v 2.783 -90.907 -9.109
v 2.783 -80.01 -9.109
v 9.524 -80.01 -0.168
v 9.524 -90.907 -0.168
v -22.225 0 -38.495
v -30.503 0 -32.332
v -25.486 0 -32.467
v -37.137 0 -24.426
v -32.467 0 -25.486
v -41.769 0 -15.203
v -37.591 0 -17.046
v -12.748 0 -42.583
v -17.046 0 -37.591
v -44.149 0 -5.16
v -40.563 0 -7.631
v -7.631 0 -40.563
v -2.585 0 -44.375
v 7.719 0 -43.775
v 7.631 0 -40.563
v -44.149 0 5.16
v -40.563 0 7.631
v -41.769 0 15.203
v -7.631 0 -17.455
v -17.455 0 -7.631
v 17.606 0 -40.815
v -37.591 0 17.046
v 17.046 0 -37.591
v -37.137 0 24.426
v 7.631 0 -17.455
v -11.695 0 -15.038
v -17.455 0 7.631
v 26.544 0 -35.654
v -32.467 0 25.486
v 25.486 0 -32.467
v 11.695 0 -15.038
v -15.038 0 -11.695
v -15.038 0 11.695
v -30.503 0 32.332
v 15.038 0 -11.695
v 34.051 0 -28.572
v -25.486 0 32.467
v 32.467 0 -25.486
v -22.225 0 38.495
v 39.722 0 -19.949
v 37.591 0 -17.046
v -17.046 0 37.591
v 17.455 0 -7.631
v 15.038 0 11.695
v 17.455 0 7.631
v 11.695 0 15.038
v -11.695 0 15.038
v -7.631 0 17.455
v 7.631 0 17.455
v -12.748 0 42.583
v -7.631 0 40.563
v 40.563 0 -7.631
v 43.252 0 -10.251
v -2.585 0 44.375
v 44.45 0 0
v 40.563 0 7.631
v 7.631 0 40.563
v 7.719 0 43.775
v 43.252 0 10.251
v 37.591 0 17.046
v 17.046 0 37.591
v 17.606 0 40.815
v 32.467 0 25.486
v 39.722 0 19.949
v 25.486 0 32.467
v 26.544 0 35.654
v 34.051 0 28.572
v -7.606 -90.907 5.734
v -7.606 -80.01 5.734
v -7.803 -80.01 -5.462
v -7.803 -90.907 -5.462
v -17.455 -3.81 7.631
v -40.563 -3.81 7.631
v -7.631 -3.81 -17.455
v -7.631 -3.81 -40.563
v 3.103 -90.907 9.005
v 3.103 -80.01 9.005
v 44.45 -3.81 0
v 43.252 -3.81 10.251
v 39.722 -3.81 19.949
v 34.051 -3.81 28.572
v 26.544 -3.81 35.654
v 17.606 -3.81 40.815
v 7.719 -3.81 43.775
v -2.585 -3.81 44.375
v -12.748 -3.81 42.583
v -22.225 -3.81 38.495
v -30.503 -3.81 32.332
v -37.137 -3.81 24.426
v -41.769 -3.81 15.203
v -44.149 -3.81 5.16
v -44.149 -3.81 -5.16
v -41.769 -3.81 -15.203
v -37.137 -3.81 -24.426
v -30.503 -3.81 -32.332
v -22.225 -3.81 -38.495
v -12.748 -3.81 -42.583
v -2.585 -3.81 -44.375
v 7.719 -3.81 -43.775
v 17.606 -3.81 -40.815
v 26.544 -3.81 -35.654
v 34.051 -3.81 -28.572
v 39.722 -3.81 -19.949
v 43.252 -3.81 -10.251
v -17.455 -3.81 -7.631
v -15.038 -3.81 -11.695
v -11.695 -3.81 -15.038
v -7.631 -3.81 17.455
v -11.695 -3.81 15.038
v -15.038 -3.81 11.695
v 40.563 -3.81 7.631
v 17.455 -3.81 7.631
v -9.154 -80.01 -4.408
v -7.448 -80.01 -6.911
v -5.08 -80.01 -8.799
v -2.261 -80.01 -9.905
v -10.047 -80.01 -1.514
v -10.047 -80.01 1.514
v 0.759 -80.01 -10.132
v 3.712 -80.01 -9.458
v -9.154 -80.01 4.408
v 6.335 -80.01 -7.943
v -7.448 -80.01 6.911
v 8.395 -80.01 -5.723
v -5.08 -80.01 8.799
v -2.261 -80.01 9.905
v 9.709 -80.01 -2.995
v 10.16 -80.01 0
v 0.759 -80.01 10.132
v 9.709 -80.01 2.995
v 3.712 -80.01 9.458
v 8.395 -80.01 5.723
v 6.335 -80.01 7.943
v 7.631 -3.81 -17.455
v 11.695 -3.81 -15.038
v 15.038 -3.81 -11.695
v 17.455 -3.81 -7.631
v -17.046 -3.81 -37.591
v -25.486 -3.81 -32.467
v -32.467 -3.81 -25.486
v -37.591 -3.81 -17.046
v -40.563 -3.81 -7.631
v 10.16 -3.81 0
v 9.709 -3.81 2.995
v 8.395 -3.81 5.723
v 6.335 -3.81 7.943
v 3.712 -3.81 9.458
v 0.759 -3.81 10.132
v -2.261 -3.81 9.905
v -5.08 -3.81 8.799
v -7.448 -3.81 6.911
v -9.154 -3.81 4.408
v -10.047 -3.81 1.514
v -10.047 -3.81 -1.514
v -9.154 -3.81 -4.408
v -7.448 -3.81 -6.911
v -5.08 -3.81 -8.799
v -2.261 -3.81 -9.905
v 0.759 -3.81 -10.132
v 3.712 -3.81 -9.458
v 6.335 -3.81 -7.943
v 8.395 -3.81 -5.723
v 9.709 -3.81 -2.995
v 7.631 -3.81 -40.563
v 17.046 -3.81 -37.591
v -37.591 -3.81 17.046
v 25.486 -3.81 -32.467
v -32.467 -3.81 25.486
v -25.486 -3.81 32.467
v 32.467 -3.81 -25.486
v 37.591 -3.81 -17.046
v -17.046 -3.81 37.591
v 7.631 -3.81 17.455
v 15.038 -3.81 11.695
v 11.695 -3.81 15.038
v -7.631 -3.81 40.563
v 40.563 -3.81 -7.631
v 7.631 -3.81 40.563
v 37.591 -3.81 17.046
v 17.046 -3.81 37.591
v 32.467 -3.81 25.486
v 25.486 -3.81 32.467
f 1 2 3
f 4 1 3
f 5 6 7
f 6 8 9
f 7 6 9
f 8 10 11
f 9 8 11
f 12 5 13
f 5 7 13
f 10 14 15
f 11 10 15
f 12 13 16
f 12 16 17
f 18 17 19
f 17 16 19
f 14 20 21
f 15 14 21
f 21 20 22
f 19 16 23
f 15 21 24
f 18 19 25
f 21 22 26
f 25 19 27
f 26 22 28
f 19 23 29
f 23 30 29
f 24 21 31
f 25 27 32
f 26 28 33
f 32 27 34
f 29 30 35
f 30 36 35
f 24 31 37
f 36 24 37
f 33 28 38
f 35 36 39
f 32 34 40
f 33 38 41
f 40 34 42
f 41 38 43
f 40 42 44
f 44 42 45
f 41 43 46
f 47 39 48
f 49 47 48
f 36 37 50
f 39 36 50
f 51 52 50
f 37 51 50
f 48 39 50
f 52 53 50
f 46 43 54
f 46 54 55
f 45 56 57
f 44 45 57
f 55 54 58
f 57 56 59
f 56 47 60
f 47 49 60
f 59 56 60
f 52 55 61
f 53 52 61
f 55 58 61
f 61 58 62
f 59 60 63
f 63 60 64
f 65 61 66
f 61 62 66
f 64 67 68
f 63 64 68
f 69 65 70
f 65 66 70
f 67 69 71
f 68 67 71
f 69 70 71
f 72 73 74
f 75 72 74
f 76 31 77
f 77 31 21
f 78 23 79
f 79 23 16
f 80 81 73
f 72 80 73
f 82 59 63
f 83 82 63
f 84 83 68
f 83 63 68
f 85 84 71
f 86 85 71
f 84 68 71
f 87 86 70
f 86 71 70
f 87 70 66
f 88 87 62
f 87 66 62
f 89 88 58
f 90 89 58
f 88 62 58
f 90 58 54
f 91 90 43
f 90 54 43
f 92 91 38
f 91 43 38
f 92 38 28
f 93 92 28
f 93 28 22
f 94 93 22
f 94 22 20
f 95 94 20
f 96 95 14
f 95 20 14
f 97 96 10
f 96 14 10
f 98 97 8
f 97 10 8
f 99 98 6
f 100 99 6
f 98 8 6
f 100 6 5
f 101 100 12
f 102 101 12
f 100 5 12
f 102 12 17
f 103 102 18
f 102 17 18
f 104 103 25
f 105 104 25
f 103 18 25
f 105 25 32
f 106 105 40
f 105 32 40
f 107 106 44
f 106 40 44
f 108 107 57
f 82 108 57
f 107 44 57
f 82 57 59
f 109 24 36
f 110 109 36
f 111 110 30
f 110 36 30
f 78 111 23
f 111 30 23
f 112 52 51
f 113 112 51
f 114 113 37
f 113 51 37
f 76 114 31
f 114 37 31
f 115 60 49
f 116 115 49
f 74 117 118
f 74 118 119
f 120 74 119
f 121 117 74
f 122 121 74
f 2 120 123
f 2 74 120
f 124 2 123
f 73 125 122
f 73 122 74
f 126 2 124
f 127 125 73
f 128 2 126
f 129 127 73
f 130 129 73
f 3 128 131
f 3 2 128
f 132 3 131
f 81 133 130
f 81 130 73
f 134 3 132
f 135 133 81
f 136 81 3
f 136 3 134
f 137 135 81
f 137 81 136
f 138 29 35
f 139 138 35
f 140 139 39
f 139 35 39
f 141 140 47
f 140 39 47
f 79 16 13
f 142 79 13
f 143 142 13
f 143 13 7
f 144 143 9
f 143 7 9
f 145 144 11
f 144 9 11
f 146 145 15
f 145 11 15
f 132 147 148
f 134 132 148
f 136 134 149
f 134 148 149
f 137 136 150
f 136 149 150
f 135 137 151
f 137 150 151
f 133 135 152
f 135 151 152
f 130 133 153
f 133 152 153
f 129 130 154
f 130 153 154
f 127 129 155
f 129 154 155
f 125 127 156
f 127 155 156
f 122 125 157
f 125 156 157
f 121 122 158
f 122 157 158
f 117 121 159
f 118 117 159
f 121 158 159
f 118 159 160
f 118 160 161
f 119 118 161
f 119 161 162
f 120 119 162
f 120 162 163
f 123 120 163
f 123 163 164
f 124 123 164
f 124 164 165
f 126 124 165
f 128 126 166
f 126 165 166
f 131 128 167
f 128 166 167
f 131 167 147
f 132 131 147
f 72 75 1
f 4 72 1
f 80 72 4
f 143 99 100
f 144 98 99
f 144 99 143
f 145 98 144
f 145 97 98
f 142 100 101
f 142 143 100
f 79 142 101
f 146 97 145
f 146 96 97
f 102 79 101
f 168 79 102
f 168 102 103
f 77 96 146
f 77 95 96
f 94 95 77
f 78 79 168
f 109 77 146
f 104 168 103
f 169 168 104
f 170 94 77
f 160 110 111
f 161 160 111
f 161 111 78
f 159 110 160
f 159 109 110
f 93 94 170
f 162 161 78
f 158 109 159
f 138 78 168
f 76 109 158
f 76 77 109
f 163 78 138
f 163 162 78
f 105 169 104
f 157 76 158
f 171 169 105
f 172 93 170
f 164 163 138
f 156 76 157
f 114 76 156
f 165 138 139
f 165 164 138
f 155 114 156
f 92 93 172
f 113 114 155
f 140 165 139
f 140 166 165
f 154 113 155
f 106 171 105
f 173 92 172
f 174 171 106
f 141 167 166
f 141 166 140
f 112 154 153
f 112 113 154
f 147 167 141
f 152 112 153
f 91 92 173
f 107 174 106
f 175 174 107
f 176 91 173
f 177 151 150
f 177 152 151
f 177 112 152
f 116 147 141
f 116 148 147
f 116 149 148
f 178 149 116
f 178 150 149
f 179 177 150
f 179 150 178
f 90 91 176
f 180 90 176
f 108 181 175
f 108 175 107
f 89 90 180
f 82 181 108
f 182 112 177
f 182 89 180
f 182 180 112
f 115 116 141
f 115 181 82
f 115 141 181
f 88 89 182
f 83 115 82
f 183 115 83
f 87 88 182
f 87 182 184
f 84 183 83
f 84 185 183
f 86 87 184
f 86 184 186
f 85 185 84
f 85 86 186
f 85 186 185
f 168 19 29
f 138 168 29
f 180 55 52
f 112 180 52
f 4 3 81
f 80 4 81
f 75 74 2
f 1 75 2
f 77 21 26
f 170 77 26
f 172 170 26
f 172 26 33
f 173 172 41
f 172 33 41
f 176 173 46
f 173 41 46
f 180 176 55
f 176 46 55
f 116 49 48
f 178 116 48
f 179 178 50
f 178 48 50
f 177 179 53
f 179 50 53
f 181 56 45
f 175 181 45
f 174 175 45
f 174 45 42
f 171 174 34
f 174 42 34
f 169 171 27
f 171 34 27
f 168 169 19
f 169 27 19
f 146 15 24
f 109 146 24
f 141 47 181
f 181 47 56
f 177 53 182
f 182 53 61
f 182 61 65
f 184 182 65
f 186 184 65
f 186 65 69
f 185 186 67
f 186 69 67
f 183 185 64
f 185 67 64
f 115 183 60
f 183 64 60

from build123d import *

# Parameters (mm, degrees)
F0_R     = 44.45
F1_DEPTH = 3.81
F2_R     = 10.16
F3_DEPTH = 76.2
F5_DEPTH = 10.8966


with BuildPart() as f1:
    # F0 (on Front) → F1 (new body)
    with BuildSketch(Plane.XZ):
        Circle(F0_R)
        with BuildLine():
            ThreePointArc((7.631228, 40.563407), (29.185832, 29.185832), (40.563407, 7.631228))
            ThreePointArc((40.563407, 7.631228), (41.096717, 3.832167), (41.275, 0))
            ThreePointArc((41.275, 0), (41.096717, -3.832167), (40.563407, -7.631228))
            ThreePointArc((40.563407, -7.631228), (29.185832, -29.185832), (7.631228, -40.563407))
            ThreePointArc((7.631228, -40.563407), (0, -41.275), (-7.631228, -40.563407))
            ThreePointArc((-7.631228, -40.563407), (-29.185832, -29.185832), (-40.563407, -7.631228))
            ThreePointArc((-40.563407, -7.631228), (-41.275, 0), (-40.563407, 7.631228))
            ThreePointArc((-40.563407, 7.631228), (-29.185832, 29.185832), (-7.631228, 40.563407))
            ThreePointArc((-7.631228, 40.563407), (0, 41.275), (7.631228, 40.563407))
        make_face(mode=Mode.SUBTRACT)
        with BuildLine():
            ThreePointArc((-17.454709, -7.631228), (-19.05, 0), (-17.454709, 7.631228))
            Line((-17.454709, 7.631228), (-40.563407, 7.631228))
            Line((-40.563407, 7.631228), (-40.563407, -7.631228))
            Line((-40.563407, -7.631228), (-17.454709, -7.631228))
        make_face()
        with BuildLine():
            Line((17.454709, -7.631228), (17.454709, 7.631228))
            ThreePointArc((17.454709, 7.631228), (13.470384, 13.470384), (7.631228, 17.454709))
            Line((7.631228, 17.454709), (-7.631228, 17.454709))
            ThreePointArc((-7.631228, 17.454709), (-13.470384, 13.470384), (-17.454709, 7.631228))
            Line((-17.454709, 7.631228), (-17.454709, -7.631228))
            ThreePointArc((-17.454709, -7.631228), (-13.470384, -13.470384), (-7.631228, -17.454709))
            Line((-7.631228, -17.454709), (7.631228, -17.454709))
            ThreePointArc((7.631228, -17.454709), (13.470384, -13.470384), (17.454709, -7.631228))
        make_face()
        with BuildLine():
            Line((-17.454709, -7.631228), (-17.454709, 7.631228))
            ThreePointArc((-17.454709, 7.631228), (-19.05, 0), (-17.454709, -7.631228))
        make_face()
        with BuildLine():
            Line((-7.631228, 17.454709), (7.631228, 17.454709))
            ThreePointArc((7.631228, 17.454709), (0, 19.05), (-7.631228, 17.454709))
        make_face()
        with BuildLine():
            ThreePointArc((17.454709, -7.631228), (18.646913, -3.898096), (19.05, 0))
            ThreePointArc((19.05, 0), (18.646913, 3.898096), (17.454709, 7.631228))
            Line((17.454709, 7.631228), (17.454709, -7.631228))
        make_face()
        with BuildLine():
            ThreePointArc((41.275, 0), (41.096717, 3.832167), (40.563407, 7.631228))
            Line((40.563407, 7.631228), (40.563407, -7.631228))
            ThreePointArc((40.563407, -7.631228), (41.096717, -3.832167), (41.275, 0))
        make_face()
        with BuildLine():
            ThreePointArc((17.454709, 7.631228), (18.646913, 3.898096), (19.05, 0))
            ThreePointArc((19.05, 0), (18.646913, -3.898096), (17.454709, -7.631228))
            Line((17.454709, -7.631228), (40.563407, -7.631228))
            Line((40.563407, -7.631228), (40.563407, 7.631228))
            Line((40.563407, 7.631228), (17.454709, 7.631228))
        make_face()
        with BuildLine():
            Line((7.631228, -40.563407), (7.631228, -17.454709))
            ThreePointArc((7.631228, -17.454709), (0, -19.05), (-7.631228, -17.454709))
            Line((-7.631228, -17.454709), (-7.631228, -40.563407))
            Line((-7.631228, -40.563407), (7.631228, -40.563407))
        make_face()
        with BuildLine():
            ThreePointArc((-7.631228, -17.454709), (0, -19.05), (7.631228, -17.454709))
            Line((7.631228, -17.454709), (-7.631228, -17.454709))
        make_face()
        with BuildLine():
            ThreePointArc((-7.631228, -40.563407), (0, -41.275), (7.631228, -40.563407))
            Line((7.631228, -40.563407), (-7.631228, -40.563407))
        make_face()
        with BuildLine():
            Line((-40.563407, -7.631228), (-40.563407, 7.631228))
            ThreePointArc((-40.563407, 7.631228), (-41.275, 0), (-40.563407, -7.631228))
        make_face()
        with BuildLine():
            ThreePointArc((-7.631228, 17.454709), (0, 19.05), (7.631228, 17.454709))
            Line((7.631228, 17.454709), (7.631228, 40.563407))
            Line((7.631228, 40.563407), (-7.631228, 40.563407))
            Line((-7.631228, 40.563407), (-7.631228, 17.454709))
        make_face()
        with BuildLine():
            Line((-7.631228, 40.563407), (7.631228, 40.563407))
            ThreePointArc((7.631228, 40.563407), (0, 41.275), (-7.631228, 40.563407))
        make_face()
    extrude(amount=F1_DEPTH)

    # F2 (on face) → F3 (join)
    with BuildSketch(Plane.XZ.offset(3.81)):
        Circle(F2_R)
    extrude(amount=F3_DEPTH)

    # F4 (on face) → F5 (join)
    with BuildSketch(Plane.XZ.offset(80.01)):
        Polygon((3.102705, 9.00549), (-7.605941, 5.733697), (-7.803435, -5.46187), (2.783154, -9.109318), (9.523518, -0.167998), align=None)
    extrude(amount=F5_DEPTH)


solid = f1.part
